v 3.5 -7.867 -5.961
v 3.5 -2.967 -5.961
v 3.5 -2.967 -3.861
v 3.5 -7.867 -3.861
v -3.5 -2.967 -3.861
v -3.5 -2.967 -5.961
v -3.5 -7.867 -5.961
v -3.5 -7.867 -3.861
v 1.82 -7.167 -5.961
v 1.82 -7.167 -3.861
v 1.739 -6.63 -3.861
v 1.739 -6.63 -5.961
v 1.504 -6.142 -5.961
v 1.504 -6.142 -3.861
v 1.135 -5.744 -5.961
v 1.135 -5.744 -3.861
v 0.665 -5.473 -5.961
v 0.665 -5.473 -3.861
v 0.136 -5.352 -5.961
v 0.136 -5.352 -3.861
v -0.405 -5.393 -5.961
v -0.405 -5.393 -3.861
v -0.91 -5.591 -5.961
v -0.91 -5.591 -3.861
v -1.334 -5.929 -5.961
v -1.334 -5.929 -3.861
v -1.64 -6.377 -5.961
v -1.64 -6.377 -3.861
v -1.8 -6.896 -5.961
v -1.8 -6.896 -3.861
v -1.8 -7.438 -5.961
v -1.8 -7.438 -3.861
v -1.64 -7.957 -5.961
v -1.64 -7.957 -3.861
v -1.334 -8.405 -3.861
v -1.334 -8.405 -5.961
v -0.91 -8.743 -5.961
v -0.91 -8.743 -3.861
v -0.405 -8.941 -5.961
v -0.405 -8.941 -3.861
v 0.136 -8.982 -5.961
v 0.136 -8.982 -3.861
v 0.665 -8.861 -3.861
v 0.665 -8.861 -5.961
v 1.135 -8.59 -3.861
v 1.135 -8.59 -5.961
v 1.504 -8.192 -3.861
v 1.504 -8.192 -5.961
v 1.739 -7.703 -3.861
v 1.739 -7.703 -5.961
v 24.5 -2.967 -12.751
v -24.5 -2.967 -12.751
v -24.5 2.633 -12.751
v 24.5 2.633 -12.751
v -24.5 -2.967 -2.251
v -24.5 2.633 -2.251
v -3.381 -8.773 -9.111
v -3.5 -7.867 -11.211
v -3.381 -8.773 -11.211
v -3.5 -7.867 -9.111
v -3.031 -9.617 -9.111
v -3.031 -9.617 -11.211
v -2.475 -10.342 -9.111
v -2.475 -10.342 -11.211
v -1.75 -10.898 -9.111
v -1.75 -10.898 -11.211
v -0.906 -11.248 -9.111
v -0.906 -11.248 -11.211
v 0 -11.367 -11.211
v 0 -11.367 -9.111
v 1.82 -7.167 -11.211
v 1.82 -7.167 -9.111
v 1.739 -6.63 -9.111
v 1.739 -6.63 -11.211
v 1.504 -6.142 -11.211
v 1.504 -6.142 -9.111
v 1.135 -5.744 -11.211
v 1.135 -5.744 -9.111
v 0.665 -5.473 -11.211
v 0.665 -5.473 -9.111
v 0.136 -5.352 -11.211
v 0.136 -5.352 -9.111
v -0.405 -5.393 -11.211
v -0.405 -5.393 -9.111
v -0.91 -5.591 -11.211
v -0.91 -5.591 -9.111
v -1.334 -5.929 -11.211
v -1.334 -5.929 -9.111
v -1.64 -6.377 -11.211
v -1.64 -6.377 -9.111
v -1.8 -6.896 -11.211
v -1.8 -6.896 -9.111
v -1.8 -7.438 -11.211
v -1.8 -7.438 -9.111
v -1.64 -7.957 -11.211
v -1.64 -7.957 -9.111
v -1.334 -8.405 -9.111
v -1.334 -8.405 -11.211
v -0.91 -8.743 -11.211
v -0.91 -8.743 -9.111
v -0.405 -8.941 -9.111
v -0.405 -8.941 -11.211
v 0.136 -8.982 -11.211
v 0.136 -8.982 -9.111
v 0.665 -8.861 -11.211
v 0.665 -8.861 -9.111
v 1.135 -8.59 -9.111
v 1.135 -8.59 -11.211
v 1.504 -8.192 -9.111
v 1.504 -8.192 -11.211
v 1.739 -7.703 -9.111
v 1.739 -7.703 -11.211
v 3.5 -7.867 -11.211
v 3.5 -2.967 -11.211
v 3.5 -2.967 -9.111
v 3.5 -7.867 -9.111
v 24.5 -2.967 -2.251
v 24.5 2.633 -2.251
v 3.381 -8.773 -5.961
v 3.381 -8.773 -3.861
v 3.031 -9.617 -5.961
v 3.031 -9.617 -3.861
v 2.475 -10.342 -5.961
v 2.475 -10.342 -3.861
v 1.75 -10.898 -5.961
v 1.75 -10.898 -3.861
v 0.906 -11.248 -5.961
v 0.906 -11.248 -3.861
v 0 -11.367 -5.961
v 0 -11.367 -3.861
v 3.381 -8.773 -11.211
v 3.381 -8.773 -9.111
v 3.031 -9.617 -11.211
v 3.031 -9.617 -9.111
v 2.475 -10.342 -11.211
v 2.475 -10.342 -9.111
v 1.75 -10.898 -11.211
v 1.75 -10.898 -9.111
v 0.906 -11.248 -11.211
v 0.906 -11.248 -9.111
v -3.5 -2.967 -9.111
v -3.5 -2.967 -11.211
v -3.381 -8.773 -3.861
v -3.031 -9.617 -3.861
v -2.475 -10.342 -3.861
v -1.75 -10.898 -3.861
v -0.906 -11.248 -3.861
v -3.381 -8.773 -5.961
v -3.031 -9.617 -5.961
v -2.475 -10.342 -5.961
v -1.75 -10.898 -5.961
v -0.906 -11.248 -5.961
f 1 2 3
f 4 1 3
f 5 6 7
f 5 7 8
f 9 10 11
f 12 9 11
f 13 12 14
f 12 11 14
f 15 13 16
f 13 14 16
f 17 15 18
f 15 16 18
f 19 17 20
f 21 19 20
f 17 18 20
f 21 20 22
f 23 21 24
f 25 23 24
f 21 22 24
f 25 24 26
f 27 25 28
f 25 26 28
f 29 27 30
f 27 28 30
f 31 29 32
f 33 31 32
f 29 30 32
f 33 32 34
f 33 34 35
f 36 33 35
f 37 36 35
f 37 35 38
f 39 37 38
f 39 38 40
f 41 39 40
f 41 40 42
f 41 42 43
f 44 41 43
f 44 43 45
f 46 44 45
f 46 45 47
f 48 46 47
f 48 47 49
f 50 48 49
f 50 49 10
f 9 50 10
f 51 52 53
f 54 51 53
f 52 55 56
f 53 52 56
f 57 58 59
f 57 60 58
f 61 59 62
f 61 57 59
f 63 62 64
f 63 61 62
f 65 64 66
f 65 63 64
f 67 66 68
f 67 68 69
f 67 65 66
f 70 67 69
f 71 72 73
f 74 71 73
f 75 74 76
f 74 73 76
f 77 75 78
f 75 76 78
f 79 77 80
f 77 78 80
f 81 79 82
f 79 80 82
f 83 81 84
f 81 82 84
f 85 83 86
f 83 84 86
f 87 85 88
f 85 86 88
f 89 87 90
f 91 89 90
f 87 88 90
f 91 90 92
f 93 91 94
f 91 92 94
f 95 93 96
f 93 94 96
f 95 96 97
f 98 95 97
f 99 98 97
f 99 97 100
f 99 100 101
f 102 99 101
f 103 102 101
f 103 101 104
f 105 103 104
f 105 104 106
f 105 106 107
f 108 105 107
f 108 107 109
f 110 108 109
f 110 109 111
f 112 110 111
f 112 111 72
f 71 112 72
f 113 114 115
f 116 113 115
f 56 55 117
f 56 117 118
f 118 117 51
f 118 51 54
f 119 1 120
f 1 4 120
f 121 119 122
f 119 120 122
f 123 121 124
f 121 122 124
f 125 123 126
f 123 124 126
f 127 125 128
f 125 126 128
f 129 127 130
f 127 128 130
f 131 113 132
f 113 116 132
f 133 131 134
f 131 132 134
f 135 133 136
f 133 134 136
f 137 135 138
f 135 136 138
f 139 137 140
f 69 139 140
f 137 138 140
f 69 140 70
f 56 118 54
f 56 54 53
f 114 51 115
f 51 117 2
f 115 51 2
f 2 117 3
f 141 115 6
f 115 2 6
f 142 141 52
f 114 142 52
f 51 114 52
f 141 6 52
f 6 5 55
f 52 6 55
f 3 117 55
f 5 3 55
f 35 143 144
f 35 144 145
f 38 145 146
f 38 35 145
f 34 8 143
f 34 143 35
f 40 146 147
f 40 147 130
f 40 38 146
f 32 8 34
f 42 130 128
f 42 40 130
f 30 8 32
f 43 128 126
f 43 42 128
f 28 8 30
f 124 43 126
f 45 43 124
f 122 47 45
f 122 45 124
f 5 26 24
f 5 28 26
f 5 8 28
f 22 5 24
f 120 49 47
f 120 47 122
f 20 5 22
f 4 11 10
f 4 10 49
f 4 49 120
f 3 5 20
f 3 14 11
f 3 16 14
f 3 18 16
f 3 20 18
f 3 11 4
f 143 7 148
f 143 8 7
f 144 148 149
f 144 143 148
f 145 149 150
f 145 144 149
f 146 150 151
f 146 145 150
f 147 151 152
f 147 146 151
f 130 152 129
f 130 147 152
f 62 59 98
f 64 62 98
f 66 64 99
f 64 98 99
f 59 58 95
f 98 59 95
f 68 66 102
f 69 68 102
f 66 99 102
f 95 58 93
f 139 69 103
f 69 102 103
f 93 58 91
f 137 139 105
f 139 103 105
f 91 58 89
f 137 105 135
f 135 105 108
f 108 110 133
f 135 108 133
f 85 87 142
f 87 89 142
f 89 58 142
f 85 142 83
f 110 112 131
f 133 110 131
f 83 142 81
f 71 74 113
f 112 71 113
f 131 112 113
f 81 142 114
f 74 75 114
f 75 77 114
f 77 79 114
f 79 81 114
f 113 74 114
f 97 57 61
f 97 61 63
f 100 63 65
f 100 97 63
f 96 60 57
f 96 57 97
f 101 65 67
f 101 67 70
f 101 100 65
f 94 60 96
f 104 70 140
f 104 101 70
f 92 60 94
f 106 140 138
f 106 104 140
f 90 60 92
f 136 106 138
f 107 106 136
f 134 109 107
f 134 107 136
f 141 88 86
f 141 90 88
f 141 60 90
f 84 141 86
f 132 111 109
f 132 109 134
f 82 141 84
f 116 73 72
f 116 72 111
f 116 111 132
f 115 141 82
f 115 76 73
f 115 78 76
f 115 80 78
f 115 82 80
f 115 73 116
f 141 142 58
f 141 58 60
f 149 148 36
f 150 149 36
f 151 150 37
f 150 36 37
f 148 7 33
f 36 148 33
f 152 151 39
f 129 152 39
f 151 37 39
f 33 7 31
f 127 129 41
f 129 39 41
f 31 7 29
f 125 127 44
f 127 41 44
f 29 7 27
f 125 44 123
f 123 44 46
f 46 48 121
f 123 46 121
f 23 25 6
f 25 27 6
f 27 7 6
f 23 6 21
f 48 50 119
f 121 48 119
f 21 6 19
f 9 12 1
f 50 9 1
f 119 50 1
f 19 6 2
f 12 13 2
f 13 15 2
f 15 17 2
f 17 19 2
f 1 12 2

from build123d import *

# Parameters (mm, degrees)
SKETCH1_W           = 8
SKETCH1_H           = 70
BOSS_EXTRUDE1_DEPTH = 15
SKETCH2_W           = 10
SKETCH2_H           = 3
BOSS_EXTRUDE2_DEPTH = 12
SKETCH3_R           = 2.6
CUT_EXTRUDE1_DEPTH  = 12
FILLET1_R           = 5
SCALE1_SCALE        = 0.7


with BuildPart() as part:
    # Sketch1 → Boss-Extrude1 (new body)
    with BuildSketch(Plane(origin=(0, 0, 0), x_dir=(0, 1, 0), z_dir=(0, 0, 1))):
        Rectangle(SKETCH1_W, SKETCH1_H)
    extrude(amount=-BOSS_EXTRUDE1_DEPTH)

    # Sketch2 → Boss-Extrude2 (add)
    with BuildSketch(Plane.XZ.offset(4)):
        with Locations((0, -3.8)):
            Rectangle(SKETCH2_W, SKETCH2_H)
        with Locations((0, -11.3)):
            Rectangle(SKETCH2_W, SKETCH2_H)
    extrude(amount=BOSS_EXTRUDE2_DEPTH)

    # Sketch3 → Cut-Extrude1 (cut)
    with BuildSketch(Plane.XY.offset(-2.3)):
        with Locations((0, -10)):
            Circle(SKETCH3_R)
    extrude(amount=-CUT_EXTRUDE1_DEPTH, mode=Mode.SUBTRACT)

    # Fillet1
    fillet1_edges = [part.edges().sort_by_distance(p)[0] for p in [
        (-5, -16, -11.3),
        (5, -16, -11.3),
        (5, -16, -3.8),
        (-5, -16, -3.8),
    ]]
    fillet(fillet1_edges, radius=FILLET1_R - 0.0001)  # a hair under: the kernel refuses the full size


with BuildPart() as part_1:
    # Scale1: scaled about (0, -0.556396742, -7.502958038)
    add(part.part.scale(SCALE1_SCALE).moved(Location((0, -0.166919023, -2.250887411))))


solid = part_1.part
